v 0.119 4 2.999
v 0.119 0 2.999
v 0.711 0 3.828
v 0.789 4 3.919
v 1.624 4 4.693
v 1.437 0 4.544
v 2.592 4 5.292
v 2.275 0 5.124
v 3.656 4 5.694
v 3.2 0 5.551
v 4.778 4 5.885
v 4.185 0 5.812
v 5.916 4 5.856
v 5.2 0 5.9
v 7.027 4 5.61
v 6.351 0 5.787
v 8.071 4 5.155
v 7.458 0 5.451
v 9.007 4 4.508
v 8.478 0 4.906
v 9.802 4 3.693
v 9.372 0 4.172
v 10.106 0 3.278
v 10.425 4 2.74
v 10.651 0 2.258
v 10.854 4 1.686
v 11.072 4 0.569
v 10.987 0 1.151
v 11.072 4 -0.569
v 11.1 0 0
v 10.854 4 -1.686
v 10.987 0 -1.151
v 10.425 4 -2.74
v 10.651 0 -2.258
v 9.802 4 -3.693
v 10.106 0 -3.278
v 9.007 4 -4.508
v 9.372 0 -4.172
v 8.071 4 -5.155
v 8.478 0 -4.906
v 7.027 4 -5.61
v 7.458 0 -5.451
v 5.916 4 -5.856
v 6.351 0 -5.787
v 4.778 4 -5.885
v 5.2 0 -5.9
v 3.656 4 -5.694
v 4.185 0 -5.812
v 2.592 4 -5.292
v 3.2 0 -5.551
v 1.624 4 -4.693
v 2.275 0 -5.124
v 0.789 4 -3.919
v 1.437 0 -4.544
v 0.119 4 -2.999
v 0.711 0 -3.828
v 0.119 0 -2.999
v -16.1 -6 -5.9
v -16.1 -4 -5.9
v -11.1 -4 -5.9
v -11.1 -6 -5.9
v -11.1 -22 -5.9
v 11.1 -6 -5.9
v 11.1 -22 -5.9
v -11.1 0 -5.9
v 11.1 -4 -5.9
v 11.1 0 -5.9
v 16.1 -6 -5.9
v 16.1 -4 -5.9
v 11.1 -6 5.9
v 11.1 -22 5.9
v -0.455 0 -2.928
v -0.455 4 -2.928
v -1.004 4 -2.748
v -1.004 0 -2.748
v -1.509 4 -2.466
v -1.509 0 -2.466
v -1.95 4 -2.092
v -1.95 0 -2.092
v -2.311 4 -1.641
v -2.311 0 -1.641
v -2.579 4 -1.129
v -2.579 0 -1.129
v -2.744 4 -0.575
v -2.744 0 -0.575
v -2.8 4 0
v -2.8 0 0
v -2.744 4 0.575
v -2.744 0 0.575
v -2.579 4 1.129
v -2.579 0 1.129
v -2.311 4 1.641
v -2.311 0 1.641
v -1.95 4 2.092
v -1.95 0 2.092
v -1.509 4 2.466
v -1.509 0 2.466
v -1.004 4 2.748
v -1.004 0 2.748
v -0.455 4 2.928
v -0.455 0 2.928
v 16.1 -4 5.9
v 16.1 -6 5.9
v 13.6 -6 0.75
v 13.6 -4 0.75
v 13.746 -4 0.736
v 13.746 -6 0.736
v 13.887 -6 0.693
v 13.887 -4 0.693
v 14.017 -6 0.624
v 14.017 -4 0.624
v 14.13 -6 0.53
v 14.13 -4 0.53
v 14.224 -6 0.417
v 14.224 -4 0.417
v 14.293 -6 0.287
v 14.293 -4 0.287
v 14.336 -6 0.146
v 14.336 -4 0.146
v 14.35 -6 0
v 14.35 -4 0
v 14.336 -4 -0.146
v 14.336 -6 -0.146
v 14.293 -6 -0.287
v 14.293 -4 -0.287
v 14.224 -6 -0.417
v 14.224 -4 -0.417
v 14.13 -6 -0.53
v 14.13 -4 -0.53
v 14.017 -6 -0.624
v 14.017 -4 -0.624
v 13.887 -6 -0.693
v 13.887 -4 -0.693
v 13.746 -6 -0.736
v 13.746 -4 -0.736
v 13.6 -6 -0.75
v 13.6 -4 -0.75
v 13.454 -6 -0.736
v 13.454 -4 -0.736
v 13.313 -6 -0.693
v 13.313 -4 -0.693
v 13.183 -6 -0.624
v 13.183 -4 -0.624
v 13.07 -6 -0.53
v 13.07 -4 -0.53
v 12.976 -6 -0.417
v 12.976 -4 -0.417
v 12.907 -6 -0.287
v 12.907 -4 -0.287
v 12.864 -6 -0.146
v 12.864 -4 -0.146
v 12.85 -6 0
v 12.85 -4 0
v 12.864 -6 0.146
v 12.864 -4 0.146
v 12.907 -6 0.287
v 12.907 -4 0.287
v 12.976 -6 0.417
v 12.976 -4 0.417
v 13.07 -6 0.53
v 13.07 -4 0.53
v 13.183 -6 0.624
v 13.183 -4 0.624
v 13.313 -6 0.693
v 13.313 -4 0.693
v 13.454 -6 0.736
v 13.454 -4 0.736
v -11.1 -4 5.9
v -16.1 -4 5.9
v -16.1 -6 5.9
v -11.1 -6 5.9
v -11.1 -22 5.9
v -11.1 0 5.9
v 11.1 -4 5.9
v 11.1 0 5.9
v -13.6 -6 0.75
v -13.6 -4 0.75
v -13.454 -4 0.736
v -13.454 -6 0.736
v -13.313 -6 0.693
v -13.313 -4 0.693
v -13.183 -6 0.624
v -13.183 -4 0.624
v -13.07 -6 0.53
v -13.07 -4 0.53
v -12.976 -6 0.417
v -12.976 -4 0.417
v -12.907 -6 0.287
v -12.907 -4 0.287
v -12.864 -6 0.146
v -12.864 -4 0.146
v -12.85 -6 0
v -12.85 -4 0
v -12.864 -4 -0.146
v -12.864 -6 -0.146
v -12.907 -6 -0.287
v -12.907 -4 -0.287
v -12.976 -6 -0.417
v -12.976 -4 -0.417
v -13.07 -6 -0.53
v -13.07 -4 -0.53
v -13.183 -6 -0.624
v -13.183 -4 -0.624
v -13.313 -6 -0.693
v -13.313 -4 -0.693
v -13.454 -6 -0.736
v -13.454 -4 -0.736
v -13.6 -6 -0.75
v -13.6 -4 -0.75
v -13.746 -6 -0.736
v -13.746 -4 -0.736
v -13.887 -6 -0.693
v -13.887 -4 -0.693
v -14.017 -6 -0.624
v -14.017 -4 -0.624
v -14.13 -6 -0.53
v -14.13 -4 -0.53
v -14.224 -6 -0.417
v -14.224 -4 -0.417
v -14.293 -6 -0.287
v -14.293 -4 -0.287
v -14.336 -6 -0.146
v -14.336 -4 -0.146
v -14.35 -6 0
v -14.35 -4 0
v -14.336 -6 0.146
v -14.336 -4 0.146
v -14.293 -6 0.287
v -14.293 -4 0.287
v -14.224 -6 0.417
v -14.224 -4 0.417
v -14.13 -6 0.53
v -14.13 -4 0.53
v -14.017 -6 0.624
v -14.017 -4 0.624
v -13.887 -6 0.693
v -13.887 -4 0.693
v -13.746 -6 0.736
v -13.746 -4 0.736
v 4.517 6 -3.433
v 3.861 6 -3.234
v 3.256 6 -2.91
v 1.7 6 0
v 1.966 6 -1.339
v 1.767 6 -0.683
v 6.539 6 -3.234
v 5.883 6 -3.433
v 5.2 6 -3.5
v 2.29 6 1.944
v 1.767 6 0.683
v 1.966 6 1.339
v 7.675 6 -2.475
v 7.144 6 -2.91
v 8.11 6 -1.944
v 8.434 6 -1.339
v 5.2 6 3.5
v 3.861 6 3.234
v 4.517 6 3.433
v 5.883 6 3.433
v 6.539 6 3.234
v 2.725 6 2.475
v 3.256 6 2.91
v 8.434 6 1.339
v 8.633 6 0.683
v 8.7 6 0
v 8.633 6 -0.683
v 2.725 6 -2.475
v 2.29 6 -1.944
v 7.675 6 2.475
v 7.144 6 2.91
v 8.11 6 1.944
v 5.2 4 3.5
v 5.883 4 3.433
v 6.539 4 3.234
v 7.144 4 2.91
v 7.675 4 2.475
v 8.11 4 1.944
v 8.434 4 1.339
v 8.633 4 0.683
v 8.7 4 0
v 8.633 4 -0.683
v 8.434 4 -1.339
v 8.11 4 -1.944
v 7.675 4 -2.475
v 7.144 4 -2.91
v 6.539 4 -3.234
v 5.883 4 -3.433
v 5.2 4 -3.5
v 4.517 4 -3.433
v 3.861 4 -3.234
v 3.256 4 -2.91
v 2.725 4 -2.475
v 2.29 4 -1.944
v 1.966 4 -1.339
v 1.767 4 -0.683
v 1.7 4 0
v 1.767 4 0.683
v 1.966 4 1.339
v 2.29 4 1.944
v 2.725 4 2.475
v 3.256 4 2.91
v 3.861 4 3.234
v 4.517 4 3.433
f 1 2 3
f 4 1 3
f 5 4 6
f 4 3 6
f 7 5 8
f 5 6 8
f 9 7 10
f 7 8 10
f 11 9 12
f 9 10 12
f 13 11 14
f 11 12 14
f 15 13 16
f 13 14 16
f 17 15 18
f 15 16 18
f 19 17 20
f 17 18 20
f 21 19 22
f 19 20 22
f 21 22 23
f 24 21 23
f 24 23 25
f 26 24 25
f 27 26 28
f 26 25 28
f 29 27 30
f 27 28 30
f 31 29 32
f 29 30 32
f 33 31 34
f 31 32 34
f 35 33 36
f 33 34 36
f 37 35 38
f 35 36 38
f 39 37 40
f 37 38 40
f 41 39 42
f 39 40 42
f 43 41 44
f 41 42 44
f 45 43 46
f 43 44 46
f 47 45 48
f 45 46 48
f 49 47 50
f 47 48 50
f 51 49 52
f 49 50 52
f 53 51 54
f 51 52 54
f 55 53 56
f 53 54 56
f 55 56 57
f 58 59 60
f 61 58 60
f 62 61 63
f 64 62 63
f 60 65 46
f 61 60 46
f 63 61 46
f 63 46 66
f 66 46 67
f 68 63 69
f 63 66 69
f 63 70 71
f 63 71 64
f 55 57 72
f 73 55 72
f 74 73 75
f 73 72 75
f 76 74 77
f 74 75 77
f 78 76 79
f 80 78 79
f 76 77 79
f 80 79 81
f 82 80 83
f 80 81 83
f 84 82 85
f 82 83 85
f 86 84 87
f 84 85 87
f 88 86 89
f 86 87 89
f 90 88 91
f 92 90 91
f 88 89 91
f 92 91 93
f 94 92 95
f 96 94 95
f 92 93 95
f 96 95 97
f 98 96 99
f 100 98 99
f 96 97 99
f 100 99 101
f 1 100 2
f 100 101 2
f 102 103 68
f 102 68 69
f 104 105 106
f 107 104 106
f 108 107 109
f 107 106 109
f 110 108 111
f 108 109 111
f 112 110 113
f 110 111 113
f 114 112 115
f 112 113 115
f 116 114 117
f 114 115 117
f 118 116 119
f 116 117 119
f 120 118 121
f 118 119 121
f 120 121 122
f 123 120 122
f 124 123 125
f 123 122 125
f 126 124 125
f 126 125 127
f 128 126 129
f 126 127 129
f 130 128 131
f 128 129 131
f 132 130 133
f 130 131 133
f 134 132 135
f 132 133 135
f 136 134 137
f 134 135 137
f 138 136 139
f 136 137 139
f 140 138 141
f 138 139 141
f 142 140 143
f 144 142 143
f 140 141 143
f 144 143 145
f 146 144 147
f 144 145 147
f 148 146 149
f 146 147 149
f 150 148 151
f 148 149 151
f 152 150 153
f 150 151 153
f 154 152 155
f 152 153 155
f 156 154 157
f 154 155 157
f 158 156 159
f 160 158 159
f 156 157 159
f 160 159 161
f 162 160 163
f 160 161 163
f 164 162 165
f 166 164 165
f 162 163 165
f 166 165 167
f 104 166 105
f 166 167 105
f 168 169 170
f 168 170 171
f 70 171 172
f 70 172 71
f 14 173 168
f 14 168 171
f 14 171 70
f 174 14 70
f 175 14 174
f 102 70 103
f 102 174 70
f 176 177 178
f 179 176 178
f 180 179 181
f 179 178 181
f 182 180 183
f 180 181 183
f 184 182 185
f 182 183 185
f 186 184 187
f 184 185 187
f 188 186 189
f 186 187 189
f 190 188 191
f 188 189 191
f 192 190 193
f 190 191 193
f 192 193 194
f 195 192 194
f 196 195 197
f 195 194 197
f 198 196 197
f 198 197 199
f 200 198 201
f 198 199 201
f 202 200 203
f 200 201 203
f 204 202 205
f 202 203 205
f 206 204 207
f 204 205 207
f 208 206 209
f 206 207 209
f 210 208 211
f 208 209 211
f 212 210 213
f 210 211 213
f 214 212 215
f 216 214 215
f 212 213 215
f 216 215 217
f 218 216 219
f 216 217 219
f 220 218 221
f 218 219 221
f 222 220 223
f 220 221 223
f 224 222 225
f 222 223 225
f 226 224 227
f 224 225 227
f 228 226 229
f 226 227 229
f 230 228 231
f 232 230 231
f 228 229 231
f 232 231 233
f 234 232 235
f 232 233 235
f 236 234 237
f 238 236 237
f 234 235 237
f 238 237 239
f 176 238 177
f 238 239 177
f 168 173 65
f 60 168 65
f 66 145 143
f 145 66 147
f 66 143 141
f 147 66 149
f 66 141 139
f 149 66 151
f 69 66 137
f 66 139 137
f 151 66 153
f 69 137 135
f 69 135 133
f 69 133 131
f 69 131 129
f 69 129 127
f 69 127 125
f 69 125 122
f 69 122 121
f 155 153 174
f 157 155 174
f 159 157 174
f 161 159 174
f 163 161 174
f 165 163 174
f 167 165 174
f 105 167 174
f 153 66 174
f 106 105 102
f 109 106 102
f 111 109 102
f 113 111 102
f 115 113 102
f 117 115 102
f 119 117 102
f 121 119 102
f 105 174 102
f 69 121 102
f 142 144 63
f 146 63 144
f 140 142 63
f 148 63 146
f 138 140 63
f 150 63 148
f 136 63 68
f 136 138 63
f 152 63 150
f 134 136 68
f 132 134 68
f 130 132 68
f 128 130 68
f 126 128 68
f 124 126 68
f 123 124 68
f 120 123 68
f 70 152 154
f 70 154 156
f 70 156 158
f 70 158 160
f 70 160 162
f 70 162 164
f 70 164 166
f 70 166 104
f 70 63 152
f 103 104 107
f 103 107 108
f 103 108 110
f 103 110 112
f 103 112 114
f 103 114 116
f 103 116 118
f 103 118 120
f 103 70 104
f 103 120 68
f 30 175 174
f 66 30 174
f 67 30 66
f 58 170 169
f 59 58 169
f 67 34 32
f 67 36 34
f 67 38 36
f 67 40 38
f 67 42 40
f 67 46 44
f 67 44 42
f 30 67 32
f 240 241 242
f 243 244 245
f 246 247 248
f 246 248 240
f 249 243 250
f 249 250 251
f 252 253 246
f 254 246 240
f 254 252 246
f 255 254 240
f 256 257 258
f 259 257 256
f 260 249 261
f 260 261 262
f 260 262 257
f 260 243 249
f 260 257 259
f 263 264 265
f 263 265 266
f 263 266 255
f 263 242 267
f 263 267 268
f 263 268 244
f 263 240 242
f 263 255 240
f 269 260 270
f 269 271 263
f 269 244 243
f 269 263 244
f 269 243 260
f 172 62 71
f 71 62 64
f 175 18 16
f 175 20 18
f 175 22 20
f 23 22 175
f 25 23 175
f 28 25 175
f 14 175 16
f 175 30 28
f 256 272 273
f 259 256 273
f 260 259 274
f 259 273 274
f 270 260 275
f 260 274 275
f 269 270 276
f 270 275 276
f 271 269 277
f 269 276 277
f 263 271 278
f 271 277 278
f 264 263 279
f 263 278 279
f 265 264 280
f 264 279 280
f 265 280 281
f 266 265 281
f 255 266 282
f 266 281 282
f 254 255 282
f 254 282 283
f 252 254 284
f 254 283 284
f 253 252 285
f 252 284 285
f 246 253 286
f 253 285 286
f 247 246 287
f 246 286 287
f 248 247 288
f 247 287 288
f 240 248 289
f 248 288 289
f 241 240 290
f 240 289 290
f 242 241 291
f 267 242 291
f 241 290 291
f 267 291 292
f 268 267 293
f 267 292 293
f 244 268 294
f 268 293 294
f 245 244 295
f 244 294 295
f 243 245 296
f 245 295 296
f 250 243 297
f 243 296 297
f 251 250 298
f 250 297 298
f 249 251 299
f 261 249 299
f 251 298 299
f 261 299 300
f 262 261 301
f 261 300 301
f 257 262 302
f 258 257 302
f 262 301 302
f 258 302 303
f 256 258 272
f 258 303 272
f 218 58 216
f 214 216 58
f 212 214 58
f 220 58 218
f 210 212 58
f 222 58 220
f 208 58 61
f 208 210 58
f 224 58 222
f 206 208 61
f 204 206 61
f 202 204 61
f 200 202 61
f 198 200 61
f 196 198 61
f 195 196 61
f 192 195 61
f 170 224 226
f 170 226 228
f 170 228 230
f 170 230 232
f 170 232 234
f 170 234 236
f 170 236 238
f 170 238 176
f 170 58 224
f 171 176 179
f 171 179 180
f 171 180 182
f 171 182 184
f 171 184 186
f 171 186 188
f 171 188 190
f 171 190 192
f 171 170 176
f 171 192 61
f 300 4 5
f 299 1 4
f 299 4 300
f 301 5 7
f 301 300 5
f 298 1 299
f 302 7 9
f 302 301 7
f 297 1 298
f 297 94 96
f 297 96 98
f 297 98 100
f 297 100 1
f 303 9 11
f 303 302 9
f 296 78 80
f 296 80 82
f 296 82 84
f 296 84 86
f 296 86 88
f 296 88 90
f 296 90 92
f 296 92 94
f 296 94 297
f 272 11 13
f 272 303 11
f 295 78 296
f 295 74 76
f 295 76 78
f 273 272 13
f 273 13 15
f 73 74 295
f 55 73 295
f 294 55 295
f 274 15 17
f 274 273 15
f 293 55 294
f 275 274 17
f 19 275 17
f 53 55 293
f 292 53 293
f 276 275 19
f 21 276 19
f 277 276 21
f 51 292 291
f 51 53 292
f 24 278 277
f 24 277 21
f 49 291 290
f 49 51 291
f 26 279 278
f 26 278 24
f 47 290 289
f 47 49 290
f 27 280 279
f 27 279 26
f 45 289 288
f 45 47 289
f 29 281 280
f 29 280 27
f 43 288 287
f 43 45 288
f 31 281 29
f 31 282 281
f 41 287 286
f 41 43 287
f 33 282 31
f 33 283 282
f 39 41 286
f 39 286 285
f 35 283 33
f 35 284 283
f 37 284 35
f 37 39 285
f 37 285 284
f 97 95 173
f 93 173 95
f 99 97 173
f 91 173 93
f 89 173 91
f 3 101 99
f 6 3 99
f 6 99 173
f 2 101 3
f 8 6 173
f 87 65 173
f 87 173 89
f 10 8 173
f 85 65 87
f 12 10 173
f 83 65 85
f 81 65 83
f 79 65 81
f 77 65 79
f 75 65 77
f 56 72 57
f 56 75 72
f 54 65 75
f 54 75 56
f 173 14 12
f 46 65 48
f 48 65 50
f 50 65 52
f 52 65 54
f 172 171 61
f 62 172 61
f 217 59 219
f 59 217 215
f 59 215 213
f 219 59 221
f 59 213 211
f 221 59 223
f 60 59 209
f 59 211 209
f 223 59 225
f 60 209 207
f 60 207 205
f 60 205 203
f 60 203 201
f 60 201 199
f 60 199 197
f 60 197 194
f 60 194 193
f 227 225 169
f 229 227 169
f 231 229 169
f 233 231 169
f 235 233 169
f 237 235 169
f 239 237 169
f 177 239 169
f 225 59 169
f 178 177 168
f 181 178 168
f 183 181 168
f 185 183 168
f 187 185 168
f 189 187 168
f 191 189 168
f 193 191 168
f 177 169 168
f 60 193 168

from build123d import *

# Parameters (mm, degrees)
SKETCH1_W           = 22.2
SKETCH1_H           = 11.8
BOSS_EXTRUDE1_DEPTH = 22
SKETCH2_W           = 5
SKETCH2_H           = 2
BOSS_EXTRUDE2_DEPTH = 11.8
BOSS_EXTRUDE3_DEPTH = 4
SKETCH5_R           = 3.5
BOSS_EXTRUDE5_DEPTH = 2
SKETCH6_R           = 0.75
CUT_EXTRUDE2_DEPTH  = 2


with BuildPart() as part:
    # Sketch1 → Boss-Extrude1 (new body)
    with BuildSketch(Plane(origin=(0, 0, 0), x_dir=(1, 0, 0), z_dir=(0, 1, 0))):
        Rectangle(SKETCH1_W, SKETCH1_H)
    extrude(amount=-BOSS_EXTRUDE1_DEPTH)

    # Sketch2 → Boss-Extrude2 (add)
    with BuildSketch(Plane.XY.offset(5.9)):
        with Locations((13.6, -5)):
            Rectangle(SKETCH2_W, SKETCH2_H)
        with Locations((-13.6, -5)):
            Rectangle(SKETCH2_W, SKETCH2_H)
    extrude(amount=-BOSS_EXTRUDE2_DEPTH)

    # Sketch4 → Boss-Extrude3 (add)
    with BuildSketch(Plane(origin=(0, 0, 0), x_dir=(1, 0, 0), z_dir=(0, 1, 0))):
        with BuildLine():
            ThreePointArc((0.119, -2.998906301), (11.1, 0), (0.119, 2.998906301))
            ThreePointArc((0.119, 2.998906301), (-2.8, 0), (0.119, -2.998906301))
        make_face()
    extrude(amount=BOSS_EXTRUDE3_DEPTH)

    # Sketch5 → Boss-Extrude5 (add)
    with BuildSketch(Plane(origin=(0, 4, 0), x_dir=(1, 0, 0), z_dir=(0, 1, 0))):
        with Locations(Location((5.2, 0, 0), (0, 0, 270))):
            Circle(SKETCH5_R)
    extrude(amount=BOSS_EXTRUDE5_DEPTH)

    # Sketch6 → Cut-Extrude2 (cut)
    with BuildSketch(Plane(origin=(0, -4, 0), x_dir=(1, 0, 0), z_dir=(0, 1, 0))):
        with Locations(Location((-13.6, 0, 0), (0, 0, 270))):
            Circle(SKETCH6_R)
        with Locations(Location((13.6, 0, 0), (0, 0, 270))):
            Circle(SKETCH6_R)
    extrude(amount=-CUT_EXTRUDE2_DEPTH, mode=Mode.SUBTRACT)


solid = part.part
